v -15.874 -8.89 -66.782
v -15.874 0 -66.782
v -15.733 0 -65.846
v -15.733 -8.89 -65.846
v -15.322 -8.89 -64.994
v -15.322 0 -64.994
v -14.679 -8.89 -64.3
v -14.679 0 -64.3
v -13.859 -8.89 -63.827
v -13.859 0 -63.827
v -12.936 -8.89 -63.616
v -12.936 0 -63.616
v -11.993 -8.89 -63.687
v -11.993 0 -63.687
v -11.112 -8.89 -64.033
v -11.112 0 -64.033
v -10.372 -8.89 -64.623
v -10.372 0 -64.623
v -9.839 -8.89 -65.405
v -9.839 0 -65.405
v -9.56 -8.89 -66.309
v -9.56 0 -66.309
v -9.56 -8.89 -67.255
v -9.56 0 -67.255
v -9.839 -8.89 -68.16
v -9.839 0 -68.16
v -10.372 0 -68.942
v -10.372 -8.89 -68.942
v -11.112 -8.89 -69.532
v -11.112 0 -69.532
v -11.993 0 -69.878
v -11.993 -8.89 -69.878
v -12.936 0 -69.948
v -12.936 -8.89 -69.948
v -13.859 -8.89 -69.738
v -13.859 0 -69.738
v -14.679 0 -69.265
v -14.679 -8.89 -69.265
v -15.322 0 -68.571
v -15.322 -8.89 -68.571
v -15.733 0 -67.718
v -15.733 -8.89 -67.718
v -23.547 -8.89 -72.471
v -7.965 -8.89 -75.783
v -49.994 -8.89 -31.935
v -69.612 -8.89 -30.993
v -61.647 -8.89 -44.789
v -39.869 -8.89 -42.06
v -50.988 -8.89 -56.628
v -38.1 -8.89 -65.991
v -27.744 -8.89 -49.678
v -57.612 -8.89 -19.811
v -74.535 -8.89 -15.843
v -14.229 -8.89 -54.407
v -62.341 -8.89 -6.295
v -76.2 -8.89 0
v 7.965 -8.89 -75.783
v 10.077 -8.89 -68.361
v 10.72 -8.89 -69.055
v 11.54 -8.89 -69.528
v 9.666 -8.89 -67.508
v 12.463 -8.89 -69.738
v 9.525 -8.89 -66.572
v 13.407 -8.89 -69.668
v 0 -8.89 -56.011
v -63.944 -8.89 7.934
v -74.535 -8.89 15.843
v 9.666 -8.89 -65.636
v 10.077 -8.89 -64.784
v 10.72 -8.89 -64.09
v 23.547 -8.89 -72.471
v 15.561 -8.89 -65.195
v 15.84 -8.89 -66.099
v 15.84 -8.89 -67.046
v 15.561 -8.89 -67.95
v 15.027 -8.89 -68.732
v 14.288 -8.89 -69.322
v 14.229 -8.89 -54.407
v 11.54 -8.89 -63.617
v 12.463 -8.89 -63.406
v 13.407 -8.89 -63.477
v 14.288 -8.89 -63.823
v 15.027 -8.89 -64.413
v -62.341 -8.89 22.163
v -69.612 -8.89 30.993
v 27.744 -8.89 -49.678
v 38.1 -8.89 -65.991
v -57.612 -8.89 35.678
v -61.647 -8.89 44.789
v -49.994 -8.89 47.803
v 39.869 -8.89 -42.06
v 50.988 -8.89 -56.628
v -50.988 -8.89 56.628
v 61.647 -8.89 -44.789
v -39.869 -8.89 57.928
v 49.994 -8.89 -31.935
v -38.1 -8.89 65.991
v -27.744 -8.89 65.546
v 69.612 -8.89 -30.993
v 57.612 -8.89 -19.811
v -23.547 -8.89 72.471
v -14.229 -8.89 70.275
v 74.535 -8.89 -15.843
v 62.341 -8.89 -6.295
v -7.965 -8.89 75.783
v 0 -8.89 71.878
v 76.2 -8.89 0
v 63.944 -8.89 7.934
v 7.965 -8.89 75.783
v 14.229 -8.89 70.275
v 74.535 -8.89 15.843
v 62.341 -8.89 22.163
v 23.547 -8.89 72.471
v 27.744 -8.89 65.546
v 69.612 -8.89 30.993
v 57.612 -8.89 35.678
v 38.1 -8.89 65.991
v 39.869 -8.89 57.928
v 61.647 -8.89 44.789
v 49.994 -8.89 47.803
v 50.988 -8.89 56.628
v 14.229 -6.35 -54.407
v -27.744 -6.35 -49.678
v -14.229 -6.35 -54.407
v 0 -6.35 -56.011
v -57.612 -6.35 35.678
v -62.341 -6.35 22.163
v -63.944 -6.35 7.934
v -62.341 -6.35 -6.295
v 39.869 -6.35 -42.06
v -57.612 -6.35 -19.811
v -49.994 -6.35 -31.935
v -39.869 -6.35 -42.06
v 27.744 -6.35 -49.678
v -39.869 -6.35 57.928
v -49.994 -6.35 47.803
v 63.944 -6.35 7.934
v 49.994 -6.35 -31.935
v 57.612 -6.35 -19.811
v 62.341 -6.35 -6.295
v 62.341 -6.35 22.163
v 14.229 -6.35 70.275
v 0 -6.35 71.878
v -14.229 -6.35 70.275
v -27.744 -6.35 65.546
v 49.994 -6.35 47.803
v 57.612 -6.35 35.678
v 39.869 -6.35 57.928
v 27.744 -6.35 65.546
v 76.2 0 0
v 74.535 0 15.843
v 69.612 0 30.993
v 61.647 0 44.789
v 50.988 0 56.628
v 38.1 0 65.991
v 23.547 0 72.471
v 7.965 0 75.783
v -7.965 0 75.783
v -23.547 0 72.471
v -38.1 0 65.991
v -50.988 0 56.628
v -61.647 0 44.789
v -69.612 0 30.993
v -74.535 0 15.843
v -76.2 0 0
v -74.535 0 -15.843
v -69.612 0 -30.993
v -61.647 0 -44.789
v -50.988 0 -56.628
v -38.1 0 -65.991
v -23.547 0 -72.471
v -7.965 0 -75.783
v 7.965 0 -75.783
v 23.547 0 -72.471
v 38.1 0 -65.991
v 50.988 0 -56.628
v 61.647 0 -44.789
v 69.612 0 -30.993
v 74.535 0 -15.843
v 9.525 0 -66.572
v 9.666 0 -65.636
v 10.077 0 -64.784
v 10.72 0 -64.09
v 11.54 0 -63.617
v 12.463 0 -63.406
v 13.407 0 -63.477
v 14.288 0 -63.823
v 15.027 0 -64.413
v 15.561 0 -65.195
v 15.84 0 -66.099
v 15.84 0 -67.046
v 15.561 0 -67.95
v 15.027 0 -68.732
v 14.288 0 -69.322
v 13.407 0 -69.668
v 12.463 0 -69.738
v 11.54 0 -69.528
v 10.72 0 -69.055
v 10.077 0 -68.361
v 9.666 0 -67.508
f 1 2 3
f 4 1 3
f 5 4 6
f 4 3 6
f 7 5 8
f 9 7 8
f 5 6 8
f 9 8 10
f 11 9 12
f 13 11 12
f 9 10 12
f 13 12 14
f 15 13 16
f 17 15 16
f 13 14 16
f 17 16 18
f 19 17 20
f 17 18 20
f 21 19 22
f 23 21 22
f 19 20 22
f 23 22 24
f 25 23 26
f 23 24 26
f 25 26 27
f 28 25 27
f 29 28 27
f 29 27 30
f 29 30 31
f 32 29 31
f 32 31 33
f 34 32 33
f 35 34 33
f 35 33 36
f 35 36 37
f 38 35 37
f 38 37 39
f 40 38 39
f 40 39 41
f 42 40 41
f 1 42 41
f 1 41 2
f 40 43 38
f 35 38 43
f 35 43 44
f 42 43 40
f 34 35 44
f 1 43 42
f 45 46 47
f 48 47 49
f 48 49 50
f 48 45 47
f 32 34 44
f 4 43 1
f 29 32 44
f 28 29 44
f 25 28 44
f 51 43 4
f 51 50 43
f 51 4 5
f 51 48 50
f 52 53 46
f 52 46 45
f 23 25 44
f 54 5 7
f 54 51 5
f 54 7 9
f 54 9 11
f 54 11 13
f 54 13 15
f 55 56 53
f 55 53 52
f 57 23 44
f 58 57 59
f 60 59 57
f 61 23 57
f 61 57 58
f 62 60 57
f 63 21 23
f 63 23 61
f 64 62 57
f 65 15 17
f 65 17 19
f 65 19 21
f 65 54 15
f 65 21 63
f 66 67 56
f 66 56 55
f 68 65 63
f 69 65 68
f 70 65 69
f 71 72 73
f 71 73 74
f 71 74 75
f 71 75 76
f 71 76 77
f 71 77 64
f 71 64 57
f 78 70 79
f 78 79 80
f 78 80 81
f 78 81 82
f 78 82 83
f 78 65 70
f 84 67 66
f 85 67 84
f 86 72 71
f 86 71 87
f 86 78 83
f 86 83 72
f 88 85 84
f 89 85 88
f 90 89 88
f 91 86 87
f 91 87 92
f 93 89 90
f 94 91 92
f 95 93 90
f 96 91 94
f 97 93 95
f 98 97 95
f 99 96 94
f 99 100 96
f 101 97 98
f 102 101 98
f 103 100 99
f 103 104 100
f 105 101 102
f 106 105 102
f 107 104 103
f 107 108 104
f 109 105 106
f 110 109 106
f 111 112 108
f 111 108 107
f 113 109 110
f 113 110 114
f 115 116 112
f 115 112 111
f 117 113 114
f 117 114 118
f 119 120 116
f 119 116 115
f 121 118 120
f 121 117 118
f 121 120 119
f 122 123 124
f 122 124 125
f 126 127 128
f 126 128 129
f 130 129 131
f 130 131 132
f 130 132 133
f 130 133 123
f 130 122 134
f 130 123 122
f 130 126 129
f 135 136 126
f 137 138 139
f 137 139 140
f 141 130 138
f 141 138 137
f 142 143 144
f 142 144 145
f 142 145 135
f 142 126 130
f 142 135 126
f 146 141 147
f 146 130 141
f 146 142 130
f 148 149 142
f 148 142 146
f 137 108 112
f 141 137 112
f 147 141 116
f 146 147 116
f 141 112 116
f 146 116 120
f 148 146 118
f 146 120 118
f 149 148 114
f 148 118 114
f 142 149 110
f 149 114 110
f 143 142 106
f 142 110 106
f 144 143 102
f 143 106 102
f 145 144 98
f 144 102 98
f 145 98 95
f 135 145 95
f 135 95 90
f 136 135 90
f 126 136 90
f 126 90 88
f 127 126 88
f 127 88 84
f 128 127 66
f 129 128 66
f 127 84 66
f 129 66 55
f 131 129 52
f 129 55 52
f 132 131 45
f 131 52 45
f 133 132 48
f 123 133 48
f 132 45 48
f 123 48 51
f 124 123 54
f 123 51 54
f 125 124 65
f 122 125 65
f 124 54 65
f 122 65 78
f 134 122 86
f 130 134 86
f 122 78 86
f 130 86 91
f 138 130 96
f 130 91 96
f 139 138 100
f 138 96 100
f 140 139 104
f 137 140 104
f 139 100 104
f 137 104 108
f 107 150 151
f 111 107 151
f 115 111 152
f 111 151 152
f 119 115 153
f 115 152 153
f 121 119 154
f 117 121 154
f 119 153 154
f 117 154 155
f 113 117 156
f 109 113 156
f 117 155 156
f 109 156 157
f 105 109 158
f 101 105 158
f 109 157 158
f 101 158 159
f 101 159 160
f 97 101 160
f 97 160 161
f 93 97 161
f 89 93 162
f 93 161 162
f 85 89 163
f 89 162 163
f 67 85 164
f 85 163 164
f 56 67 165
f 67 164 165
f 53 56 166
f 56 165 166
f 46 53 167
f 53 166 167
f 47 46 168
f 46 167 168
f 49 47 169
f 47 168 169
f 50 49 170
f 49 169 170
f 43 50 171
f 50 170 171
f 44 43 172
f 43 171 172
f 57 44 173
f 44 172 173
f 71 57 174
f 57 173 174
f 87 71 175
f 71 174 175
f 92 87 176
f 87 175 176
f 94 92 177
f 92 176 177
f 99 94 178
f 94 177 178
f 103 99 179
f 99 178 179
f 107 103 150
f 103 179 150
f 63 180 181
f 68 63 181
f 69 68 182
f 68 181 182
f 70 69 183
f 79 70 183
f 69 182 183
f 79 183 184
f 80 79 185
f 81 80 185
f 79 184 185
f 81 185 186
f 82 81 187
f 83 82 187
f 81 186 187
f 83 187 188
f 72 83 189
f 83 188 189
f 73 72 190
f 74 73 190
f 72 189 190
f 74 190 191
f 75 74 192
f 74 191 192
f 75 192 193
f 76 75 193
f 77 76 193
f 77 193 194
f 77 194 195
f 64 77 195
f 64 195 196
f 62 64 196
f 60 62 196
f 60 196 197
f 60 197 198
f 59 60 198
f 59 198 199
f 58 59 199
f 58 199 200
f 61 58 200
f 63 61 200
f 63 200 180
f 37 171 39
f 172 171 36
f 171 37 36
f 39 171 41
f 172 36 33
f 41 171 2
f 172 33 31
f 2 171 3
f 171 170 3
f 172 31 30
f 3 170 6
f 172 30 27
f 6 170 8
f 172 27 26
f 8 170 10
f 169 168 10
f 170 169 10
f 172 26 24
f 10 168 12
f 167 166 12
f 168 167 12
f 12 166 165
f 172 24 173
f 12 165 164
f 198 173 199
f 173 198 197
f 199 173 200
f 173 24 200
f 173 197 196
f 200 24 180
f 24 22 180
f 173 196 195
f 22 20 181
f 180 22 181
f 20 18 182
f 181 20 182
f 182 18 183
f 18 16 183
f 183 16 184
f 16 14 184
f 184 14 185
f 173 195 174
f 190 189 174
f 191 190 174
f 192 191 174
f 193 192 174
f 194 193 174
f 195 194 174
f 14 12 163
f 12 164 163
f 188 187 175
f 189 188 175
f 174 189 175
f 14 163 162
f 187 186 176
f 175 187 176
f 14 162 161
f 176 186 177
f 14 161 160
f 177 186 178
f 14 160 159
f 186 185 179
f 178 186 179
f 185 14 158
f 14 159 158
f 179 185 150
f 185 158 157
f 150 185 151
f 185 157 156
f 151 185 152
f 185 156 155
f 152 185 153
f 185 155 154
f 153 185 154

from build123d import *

# Parameters (mm, degrees)
F0_R     = 76.2
F1_DEPTH = 8.89
F2_R     = 63.9445
F3_DEPTH = 2.54
F5_D     = 6.35


with BuildPart() as f1:
    # F0 (on Front) → F1 (new body)
    with BuildSketch(Plane.XZ):
        Circle(F0_R)
    extrude(amount=F1_DEPTH)

    # F2 (on face) → F3 (cut)
    with BuildSketch(Plane.XZ.offset(8.89)):
        with Locations((0, 7.933864)):
            Circle(F2_R)
    extrude(amount=-F3_DEPTH, mode=Mode.SUBTRACT)

    # F5 (through all)
    with Locations(Plane.XZ.offset(8.89)):
        with Locations((-12.699133, -66.782228), (12.7, -66.572319)):
            Hole(F5_D / 2)


solid = f1.part
